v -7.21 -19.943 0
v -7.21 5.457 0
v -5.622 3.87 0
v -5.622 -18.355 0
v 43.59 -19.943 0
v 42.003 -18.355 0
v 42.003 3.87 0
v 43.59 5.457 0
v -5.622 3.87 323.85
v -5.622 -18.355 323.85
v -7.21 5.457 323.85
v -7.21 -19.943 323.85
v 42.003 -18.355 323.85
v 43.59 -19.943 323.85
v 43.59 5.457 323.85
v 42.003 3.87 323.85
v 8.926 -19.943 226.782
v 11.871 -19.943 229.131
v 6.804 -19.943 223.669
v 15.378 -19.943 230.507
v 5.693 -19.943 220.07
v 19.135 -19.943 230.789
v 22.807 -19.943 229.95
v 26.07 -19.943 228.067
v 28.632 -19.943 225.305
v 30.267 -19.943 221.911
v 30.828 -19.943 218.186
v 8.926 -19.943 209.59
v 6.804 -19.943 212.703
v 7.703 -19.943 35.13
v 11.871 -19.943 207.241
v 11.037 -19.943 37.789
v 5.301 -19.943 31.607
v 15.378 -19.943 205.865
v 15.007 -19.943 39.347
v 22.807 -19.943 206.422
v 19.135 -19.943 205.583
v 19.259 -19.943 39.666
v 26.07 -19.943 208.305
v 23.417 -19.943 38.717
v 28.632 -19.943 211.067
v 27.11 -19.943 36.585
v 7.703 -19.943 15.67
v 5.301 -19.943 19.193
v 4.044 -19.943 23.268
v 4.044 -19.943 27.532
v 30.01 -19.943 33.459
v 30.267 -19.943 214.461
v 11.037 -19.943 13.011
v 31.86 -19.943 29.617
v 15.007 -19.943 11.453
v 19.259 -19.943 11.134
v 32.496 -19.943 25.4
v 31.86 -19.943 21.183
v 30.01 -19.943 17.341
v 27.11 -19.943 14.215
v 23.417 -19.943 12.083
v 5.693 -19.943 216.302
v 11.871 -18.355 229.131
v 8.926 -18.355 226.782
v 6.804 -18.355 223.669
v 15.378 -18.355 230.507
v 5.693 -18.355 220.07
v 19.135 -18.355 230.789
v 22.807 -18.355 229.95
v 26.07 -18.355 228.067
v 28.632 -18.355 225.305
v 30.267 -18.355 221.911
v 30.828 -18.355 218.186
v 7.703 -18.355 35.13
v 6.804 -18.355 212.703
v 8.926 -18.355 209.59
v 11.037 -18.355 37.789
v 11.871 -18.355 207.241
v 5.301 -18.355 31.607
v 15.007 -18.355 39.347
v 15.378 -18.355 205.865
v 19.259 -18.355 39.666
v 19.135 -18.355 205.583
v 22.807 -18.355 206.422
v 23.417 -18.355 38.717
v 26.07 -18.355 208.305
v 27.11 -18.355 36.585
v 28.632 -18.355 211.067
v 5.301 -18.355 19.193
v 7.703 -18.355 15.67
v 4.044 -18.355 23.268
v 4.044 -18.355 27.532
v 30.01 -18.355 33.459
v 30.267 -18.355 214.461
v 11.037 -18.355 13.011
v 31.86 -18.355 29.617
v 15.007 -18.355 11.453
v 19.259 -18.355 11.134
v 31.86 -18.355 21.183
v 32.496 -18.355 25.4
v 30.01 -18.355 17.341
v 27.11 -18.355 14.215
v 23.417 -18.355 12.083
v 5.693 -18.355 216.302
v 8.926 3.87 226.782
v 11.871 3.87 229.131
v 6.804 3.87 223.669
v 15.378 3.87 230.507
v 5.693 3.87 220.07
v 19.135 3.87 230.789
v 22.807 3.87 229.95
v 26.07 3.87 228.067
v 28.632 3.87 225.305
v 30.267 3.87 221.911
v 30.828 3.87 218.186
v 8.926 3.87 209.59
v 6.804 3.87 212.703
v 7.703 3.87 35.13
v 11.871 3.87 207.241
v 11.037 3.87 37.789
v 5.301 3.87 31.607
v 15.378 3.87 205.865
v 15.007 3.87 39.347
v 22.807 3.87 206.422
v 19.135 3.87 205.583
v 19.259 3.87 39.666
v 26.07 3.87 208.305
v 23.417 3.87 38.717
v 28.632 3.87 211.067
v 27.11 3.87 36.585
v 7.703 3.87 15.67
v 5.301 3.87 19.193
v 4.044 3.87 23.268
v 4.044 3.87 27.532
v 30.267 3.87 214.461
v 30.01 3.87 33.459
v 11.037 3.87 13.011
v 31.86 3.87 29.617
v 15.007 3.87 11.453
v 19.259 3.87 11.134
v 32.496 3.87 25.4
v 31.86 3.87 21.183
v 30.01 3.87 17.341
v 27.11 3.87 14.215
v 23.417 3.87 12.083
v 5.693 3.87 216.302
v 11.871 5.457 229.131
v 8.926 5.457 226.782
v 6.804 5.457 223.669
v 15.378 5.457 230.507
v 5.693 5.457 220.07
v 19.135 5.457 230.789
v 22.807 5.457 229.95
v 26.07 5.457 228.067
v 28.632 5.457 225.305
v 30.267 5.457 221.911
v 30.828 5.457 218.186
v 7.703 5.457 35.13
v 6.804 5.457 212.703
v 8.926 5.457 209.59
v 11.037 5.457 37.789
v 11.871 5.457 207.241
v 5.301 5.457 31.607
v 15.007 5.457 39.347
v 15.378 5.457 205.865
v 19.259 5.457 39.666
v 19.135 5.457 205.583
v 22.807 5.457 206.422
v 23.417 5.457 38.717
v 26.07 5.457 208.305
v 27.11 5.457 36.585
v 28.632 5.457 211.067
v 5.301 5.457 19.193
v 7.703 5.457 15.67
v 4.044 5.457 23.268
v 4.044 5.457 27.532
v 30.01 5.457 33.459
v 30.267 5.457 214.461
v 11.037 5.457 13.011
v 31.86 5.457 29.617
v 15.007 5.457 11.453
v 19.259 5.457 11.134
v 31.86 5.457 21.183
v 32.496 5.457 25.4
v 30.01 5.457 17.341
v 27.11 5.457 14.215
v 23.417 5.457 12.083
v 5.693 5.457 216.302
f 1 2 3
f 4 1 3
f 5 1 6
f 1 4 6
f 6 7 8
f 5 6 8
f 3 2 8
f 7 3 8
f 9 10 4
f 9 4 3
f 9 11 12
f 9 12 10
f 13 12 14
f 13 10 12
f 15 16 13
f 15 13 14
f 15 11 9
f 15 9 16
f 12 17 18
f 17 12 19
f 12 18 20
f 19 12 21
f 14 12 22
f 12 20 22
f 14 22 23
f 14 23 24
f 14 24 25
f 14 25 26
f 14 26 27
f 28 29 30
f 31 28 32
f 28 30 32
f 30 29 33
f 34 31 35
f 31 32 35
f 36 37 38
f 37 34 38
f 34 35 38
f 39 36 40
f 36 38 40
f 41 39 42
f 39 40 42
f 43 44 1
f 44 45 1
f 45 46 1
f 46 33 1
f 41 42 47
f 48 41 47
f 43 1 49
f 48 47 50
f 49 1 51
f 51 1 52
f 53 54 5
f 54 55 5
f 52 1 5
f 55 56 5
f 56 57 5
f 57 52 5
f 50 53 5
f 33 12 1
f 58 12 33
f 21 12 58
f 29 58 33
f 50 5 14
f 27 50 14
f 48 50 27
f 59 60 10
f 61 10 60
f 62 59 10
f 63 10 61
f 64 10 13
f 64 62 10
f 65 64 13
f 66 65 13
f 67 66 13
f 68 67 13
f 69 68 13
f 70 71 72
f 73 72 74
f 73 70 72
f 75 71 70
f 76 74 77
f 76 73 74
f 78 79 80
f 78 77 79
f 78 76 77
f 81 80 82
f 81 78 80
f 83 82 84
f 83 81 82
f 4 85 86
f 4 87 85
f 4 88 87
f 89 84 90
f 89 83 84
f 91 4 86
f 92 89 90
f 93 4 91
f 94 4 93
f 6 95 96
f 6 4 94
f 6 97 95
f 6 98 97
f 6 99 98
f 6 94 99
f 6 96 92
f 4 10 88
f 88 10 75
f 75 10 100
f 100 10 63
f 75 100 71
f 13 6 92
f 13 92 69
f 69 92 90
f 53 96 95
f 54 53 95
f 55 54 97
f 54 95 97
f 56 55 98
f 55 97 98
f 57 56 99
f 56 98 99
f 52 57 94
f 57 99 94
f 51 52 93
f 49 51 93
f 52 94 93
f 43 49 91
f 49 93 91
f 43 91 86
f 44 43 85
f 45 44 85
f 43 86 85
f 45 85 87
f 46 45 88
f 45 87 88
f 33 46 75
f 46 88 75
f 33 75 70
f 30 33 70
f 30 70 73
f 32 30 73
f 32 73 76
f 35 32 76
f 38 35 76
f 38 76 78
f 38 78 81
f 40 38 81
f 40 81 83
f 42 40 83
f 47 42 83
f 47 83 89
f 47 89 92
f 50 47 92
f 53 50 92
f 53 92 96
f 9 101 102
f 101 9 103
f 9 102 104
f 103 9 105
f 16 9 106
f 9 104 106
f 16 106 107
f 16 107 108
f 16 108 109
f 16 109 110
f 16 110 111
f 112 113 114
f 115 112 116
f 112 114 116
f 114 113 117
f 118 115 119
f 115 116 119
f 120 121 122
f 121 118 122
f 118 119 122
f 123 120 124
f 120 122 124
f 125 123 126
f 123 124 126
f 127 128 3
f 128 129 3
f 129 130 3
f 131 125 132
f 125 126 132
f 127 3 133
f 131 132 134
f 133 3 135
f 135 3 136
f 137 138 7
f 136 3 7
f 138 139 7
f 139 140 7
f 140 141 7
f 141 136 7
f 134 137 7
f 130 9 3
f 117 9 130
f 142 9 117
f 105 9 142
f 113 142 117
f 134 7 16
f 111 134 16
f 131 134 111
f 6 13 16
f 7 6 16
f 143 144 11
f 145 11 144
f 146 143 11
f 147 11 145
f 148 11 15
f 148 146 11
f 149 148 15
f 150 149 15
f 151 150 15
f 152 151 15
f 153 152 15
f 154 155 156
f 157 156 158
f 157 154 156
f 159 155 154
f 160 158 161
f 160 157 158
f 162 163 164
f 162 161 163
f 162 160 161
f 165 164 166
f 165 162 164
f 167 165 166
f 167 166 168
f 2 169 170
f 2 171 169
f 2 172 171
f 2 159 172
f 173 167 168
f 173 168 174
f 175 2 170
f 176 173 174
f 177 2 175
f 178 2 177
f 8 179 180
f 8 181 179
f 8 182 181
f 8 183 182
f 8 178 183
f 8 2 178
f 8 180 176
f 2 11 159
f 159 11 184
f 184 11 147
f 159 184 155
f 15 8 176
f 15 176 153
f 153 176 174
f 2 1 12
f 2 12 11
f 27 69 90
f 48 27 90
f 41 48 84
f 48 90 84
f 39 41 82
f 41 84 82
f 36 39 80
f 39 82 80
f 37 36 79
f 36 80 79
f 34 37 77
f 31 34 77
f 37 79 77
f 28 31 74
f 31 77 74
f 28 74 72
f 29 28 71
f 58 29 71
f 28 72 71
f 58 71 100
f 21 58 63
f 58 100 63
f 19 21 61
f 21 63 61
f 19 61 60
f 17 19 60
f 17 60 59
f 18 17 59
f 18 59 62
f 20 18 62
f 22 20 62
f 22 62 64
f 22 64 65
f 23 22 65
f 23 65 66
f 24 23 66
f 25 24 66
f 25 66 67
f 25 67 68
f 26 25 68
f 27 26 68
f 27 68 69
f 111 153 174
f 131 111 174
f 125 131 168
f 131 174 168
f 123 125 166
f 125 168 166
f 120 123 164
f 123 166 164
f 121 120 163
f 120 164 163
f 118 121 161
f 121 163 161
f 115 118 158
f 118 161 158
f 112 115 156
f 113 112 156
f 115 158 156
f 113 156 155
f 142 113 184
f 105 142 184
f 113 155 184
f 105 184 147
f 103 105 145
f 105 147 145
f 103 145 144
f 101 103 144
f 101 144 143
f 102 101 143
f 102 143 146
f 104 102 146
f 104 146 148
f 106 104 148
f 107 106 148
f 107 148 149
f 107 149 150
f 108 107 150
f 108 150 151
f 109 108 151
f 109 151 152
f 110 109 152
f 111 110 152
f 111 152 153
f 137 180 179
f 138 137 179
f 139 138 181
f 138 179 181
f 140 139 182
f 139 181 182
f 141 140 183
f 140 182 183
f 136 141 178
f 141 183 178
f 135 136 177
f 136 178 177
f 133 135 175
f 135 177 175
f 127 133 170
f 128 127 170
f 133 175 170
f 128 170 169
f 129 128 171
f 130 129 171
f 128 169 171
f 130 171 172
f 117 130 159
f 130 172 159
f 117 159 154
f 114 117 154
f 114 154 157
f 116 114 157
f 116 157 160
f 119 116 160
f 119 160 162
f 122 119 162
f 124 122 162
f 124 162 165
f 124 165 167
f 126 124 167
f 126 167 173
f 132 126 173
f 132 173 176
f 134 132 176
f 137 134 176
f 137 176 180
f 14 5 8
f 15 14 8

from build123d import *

# Parameters (mm, degrees)
SKETCH1_W           = 50.8
SKETCH1_H           = 25.4
SKETCH1_W_2         = 47.625
SKETCH1_H_2         = 22.225
BOSS_EXTRUDE1_DEPTH = 323.85
SKETCH2_R           = 14.305600685
CUT_EXTRUDE1_DEPTH  = 26.4
SKETCH4_R           = 12.637898421
CUT_EXTRUDE3_DEPTH  = 26.4


with BuildPart() as part:
    # Sketch1 → Boss-Extrude1 (new body)
    with BuildSketch(Plane.XY):
        with Locations((18.190104167, -7.24296875)):
            Rectangle(SKETCH1_W, SKETCH1_H)
        with Locations((18.190104167, -7.24296875)):
            Rectangle(SKETCH1_W_2, SKETCH1_H_2, mode=Mode.SUBTRACT)
    extrude(amount=BOSS_EXTRUDE1_DEPTH)

    # Sketch2 → Cut-Extrude1 (cut, through all)
    with BuildSketch(Plane(origin=(0, 5.45703125, 0), x_dir=(1, 0, 0), z_dir=(0, 1, 0))):
        with Locations((18.190104167, -25.4)):
            Circle(SKETCH2_R)
    extrude(amount=-CUT_EXTRUDE1_DEPTH, mode=Mode.SUBTRACT)

    # Sketch4 → Cut-Extrude3 (cut, through all)
    with BuildSketch(Plane(origin=(0, 5.45703125, 0), x_dir=(1, 0, 0), z_dir=(0, 1, 0))):
        with Locations((18.190104167, -218.186)):
            Circle(SKETCH4_R)
    extrude(amount=-CUT_EXTRUDE3_DEPTH, mode=Mode.SUBTRACT)


solid = part.part
